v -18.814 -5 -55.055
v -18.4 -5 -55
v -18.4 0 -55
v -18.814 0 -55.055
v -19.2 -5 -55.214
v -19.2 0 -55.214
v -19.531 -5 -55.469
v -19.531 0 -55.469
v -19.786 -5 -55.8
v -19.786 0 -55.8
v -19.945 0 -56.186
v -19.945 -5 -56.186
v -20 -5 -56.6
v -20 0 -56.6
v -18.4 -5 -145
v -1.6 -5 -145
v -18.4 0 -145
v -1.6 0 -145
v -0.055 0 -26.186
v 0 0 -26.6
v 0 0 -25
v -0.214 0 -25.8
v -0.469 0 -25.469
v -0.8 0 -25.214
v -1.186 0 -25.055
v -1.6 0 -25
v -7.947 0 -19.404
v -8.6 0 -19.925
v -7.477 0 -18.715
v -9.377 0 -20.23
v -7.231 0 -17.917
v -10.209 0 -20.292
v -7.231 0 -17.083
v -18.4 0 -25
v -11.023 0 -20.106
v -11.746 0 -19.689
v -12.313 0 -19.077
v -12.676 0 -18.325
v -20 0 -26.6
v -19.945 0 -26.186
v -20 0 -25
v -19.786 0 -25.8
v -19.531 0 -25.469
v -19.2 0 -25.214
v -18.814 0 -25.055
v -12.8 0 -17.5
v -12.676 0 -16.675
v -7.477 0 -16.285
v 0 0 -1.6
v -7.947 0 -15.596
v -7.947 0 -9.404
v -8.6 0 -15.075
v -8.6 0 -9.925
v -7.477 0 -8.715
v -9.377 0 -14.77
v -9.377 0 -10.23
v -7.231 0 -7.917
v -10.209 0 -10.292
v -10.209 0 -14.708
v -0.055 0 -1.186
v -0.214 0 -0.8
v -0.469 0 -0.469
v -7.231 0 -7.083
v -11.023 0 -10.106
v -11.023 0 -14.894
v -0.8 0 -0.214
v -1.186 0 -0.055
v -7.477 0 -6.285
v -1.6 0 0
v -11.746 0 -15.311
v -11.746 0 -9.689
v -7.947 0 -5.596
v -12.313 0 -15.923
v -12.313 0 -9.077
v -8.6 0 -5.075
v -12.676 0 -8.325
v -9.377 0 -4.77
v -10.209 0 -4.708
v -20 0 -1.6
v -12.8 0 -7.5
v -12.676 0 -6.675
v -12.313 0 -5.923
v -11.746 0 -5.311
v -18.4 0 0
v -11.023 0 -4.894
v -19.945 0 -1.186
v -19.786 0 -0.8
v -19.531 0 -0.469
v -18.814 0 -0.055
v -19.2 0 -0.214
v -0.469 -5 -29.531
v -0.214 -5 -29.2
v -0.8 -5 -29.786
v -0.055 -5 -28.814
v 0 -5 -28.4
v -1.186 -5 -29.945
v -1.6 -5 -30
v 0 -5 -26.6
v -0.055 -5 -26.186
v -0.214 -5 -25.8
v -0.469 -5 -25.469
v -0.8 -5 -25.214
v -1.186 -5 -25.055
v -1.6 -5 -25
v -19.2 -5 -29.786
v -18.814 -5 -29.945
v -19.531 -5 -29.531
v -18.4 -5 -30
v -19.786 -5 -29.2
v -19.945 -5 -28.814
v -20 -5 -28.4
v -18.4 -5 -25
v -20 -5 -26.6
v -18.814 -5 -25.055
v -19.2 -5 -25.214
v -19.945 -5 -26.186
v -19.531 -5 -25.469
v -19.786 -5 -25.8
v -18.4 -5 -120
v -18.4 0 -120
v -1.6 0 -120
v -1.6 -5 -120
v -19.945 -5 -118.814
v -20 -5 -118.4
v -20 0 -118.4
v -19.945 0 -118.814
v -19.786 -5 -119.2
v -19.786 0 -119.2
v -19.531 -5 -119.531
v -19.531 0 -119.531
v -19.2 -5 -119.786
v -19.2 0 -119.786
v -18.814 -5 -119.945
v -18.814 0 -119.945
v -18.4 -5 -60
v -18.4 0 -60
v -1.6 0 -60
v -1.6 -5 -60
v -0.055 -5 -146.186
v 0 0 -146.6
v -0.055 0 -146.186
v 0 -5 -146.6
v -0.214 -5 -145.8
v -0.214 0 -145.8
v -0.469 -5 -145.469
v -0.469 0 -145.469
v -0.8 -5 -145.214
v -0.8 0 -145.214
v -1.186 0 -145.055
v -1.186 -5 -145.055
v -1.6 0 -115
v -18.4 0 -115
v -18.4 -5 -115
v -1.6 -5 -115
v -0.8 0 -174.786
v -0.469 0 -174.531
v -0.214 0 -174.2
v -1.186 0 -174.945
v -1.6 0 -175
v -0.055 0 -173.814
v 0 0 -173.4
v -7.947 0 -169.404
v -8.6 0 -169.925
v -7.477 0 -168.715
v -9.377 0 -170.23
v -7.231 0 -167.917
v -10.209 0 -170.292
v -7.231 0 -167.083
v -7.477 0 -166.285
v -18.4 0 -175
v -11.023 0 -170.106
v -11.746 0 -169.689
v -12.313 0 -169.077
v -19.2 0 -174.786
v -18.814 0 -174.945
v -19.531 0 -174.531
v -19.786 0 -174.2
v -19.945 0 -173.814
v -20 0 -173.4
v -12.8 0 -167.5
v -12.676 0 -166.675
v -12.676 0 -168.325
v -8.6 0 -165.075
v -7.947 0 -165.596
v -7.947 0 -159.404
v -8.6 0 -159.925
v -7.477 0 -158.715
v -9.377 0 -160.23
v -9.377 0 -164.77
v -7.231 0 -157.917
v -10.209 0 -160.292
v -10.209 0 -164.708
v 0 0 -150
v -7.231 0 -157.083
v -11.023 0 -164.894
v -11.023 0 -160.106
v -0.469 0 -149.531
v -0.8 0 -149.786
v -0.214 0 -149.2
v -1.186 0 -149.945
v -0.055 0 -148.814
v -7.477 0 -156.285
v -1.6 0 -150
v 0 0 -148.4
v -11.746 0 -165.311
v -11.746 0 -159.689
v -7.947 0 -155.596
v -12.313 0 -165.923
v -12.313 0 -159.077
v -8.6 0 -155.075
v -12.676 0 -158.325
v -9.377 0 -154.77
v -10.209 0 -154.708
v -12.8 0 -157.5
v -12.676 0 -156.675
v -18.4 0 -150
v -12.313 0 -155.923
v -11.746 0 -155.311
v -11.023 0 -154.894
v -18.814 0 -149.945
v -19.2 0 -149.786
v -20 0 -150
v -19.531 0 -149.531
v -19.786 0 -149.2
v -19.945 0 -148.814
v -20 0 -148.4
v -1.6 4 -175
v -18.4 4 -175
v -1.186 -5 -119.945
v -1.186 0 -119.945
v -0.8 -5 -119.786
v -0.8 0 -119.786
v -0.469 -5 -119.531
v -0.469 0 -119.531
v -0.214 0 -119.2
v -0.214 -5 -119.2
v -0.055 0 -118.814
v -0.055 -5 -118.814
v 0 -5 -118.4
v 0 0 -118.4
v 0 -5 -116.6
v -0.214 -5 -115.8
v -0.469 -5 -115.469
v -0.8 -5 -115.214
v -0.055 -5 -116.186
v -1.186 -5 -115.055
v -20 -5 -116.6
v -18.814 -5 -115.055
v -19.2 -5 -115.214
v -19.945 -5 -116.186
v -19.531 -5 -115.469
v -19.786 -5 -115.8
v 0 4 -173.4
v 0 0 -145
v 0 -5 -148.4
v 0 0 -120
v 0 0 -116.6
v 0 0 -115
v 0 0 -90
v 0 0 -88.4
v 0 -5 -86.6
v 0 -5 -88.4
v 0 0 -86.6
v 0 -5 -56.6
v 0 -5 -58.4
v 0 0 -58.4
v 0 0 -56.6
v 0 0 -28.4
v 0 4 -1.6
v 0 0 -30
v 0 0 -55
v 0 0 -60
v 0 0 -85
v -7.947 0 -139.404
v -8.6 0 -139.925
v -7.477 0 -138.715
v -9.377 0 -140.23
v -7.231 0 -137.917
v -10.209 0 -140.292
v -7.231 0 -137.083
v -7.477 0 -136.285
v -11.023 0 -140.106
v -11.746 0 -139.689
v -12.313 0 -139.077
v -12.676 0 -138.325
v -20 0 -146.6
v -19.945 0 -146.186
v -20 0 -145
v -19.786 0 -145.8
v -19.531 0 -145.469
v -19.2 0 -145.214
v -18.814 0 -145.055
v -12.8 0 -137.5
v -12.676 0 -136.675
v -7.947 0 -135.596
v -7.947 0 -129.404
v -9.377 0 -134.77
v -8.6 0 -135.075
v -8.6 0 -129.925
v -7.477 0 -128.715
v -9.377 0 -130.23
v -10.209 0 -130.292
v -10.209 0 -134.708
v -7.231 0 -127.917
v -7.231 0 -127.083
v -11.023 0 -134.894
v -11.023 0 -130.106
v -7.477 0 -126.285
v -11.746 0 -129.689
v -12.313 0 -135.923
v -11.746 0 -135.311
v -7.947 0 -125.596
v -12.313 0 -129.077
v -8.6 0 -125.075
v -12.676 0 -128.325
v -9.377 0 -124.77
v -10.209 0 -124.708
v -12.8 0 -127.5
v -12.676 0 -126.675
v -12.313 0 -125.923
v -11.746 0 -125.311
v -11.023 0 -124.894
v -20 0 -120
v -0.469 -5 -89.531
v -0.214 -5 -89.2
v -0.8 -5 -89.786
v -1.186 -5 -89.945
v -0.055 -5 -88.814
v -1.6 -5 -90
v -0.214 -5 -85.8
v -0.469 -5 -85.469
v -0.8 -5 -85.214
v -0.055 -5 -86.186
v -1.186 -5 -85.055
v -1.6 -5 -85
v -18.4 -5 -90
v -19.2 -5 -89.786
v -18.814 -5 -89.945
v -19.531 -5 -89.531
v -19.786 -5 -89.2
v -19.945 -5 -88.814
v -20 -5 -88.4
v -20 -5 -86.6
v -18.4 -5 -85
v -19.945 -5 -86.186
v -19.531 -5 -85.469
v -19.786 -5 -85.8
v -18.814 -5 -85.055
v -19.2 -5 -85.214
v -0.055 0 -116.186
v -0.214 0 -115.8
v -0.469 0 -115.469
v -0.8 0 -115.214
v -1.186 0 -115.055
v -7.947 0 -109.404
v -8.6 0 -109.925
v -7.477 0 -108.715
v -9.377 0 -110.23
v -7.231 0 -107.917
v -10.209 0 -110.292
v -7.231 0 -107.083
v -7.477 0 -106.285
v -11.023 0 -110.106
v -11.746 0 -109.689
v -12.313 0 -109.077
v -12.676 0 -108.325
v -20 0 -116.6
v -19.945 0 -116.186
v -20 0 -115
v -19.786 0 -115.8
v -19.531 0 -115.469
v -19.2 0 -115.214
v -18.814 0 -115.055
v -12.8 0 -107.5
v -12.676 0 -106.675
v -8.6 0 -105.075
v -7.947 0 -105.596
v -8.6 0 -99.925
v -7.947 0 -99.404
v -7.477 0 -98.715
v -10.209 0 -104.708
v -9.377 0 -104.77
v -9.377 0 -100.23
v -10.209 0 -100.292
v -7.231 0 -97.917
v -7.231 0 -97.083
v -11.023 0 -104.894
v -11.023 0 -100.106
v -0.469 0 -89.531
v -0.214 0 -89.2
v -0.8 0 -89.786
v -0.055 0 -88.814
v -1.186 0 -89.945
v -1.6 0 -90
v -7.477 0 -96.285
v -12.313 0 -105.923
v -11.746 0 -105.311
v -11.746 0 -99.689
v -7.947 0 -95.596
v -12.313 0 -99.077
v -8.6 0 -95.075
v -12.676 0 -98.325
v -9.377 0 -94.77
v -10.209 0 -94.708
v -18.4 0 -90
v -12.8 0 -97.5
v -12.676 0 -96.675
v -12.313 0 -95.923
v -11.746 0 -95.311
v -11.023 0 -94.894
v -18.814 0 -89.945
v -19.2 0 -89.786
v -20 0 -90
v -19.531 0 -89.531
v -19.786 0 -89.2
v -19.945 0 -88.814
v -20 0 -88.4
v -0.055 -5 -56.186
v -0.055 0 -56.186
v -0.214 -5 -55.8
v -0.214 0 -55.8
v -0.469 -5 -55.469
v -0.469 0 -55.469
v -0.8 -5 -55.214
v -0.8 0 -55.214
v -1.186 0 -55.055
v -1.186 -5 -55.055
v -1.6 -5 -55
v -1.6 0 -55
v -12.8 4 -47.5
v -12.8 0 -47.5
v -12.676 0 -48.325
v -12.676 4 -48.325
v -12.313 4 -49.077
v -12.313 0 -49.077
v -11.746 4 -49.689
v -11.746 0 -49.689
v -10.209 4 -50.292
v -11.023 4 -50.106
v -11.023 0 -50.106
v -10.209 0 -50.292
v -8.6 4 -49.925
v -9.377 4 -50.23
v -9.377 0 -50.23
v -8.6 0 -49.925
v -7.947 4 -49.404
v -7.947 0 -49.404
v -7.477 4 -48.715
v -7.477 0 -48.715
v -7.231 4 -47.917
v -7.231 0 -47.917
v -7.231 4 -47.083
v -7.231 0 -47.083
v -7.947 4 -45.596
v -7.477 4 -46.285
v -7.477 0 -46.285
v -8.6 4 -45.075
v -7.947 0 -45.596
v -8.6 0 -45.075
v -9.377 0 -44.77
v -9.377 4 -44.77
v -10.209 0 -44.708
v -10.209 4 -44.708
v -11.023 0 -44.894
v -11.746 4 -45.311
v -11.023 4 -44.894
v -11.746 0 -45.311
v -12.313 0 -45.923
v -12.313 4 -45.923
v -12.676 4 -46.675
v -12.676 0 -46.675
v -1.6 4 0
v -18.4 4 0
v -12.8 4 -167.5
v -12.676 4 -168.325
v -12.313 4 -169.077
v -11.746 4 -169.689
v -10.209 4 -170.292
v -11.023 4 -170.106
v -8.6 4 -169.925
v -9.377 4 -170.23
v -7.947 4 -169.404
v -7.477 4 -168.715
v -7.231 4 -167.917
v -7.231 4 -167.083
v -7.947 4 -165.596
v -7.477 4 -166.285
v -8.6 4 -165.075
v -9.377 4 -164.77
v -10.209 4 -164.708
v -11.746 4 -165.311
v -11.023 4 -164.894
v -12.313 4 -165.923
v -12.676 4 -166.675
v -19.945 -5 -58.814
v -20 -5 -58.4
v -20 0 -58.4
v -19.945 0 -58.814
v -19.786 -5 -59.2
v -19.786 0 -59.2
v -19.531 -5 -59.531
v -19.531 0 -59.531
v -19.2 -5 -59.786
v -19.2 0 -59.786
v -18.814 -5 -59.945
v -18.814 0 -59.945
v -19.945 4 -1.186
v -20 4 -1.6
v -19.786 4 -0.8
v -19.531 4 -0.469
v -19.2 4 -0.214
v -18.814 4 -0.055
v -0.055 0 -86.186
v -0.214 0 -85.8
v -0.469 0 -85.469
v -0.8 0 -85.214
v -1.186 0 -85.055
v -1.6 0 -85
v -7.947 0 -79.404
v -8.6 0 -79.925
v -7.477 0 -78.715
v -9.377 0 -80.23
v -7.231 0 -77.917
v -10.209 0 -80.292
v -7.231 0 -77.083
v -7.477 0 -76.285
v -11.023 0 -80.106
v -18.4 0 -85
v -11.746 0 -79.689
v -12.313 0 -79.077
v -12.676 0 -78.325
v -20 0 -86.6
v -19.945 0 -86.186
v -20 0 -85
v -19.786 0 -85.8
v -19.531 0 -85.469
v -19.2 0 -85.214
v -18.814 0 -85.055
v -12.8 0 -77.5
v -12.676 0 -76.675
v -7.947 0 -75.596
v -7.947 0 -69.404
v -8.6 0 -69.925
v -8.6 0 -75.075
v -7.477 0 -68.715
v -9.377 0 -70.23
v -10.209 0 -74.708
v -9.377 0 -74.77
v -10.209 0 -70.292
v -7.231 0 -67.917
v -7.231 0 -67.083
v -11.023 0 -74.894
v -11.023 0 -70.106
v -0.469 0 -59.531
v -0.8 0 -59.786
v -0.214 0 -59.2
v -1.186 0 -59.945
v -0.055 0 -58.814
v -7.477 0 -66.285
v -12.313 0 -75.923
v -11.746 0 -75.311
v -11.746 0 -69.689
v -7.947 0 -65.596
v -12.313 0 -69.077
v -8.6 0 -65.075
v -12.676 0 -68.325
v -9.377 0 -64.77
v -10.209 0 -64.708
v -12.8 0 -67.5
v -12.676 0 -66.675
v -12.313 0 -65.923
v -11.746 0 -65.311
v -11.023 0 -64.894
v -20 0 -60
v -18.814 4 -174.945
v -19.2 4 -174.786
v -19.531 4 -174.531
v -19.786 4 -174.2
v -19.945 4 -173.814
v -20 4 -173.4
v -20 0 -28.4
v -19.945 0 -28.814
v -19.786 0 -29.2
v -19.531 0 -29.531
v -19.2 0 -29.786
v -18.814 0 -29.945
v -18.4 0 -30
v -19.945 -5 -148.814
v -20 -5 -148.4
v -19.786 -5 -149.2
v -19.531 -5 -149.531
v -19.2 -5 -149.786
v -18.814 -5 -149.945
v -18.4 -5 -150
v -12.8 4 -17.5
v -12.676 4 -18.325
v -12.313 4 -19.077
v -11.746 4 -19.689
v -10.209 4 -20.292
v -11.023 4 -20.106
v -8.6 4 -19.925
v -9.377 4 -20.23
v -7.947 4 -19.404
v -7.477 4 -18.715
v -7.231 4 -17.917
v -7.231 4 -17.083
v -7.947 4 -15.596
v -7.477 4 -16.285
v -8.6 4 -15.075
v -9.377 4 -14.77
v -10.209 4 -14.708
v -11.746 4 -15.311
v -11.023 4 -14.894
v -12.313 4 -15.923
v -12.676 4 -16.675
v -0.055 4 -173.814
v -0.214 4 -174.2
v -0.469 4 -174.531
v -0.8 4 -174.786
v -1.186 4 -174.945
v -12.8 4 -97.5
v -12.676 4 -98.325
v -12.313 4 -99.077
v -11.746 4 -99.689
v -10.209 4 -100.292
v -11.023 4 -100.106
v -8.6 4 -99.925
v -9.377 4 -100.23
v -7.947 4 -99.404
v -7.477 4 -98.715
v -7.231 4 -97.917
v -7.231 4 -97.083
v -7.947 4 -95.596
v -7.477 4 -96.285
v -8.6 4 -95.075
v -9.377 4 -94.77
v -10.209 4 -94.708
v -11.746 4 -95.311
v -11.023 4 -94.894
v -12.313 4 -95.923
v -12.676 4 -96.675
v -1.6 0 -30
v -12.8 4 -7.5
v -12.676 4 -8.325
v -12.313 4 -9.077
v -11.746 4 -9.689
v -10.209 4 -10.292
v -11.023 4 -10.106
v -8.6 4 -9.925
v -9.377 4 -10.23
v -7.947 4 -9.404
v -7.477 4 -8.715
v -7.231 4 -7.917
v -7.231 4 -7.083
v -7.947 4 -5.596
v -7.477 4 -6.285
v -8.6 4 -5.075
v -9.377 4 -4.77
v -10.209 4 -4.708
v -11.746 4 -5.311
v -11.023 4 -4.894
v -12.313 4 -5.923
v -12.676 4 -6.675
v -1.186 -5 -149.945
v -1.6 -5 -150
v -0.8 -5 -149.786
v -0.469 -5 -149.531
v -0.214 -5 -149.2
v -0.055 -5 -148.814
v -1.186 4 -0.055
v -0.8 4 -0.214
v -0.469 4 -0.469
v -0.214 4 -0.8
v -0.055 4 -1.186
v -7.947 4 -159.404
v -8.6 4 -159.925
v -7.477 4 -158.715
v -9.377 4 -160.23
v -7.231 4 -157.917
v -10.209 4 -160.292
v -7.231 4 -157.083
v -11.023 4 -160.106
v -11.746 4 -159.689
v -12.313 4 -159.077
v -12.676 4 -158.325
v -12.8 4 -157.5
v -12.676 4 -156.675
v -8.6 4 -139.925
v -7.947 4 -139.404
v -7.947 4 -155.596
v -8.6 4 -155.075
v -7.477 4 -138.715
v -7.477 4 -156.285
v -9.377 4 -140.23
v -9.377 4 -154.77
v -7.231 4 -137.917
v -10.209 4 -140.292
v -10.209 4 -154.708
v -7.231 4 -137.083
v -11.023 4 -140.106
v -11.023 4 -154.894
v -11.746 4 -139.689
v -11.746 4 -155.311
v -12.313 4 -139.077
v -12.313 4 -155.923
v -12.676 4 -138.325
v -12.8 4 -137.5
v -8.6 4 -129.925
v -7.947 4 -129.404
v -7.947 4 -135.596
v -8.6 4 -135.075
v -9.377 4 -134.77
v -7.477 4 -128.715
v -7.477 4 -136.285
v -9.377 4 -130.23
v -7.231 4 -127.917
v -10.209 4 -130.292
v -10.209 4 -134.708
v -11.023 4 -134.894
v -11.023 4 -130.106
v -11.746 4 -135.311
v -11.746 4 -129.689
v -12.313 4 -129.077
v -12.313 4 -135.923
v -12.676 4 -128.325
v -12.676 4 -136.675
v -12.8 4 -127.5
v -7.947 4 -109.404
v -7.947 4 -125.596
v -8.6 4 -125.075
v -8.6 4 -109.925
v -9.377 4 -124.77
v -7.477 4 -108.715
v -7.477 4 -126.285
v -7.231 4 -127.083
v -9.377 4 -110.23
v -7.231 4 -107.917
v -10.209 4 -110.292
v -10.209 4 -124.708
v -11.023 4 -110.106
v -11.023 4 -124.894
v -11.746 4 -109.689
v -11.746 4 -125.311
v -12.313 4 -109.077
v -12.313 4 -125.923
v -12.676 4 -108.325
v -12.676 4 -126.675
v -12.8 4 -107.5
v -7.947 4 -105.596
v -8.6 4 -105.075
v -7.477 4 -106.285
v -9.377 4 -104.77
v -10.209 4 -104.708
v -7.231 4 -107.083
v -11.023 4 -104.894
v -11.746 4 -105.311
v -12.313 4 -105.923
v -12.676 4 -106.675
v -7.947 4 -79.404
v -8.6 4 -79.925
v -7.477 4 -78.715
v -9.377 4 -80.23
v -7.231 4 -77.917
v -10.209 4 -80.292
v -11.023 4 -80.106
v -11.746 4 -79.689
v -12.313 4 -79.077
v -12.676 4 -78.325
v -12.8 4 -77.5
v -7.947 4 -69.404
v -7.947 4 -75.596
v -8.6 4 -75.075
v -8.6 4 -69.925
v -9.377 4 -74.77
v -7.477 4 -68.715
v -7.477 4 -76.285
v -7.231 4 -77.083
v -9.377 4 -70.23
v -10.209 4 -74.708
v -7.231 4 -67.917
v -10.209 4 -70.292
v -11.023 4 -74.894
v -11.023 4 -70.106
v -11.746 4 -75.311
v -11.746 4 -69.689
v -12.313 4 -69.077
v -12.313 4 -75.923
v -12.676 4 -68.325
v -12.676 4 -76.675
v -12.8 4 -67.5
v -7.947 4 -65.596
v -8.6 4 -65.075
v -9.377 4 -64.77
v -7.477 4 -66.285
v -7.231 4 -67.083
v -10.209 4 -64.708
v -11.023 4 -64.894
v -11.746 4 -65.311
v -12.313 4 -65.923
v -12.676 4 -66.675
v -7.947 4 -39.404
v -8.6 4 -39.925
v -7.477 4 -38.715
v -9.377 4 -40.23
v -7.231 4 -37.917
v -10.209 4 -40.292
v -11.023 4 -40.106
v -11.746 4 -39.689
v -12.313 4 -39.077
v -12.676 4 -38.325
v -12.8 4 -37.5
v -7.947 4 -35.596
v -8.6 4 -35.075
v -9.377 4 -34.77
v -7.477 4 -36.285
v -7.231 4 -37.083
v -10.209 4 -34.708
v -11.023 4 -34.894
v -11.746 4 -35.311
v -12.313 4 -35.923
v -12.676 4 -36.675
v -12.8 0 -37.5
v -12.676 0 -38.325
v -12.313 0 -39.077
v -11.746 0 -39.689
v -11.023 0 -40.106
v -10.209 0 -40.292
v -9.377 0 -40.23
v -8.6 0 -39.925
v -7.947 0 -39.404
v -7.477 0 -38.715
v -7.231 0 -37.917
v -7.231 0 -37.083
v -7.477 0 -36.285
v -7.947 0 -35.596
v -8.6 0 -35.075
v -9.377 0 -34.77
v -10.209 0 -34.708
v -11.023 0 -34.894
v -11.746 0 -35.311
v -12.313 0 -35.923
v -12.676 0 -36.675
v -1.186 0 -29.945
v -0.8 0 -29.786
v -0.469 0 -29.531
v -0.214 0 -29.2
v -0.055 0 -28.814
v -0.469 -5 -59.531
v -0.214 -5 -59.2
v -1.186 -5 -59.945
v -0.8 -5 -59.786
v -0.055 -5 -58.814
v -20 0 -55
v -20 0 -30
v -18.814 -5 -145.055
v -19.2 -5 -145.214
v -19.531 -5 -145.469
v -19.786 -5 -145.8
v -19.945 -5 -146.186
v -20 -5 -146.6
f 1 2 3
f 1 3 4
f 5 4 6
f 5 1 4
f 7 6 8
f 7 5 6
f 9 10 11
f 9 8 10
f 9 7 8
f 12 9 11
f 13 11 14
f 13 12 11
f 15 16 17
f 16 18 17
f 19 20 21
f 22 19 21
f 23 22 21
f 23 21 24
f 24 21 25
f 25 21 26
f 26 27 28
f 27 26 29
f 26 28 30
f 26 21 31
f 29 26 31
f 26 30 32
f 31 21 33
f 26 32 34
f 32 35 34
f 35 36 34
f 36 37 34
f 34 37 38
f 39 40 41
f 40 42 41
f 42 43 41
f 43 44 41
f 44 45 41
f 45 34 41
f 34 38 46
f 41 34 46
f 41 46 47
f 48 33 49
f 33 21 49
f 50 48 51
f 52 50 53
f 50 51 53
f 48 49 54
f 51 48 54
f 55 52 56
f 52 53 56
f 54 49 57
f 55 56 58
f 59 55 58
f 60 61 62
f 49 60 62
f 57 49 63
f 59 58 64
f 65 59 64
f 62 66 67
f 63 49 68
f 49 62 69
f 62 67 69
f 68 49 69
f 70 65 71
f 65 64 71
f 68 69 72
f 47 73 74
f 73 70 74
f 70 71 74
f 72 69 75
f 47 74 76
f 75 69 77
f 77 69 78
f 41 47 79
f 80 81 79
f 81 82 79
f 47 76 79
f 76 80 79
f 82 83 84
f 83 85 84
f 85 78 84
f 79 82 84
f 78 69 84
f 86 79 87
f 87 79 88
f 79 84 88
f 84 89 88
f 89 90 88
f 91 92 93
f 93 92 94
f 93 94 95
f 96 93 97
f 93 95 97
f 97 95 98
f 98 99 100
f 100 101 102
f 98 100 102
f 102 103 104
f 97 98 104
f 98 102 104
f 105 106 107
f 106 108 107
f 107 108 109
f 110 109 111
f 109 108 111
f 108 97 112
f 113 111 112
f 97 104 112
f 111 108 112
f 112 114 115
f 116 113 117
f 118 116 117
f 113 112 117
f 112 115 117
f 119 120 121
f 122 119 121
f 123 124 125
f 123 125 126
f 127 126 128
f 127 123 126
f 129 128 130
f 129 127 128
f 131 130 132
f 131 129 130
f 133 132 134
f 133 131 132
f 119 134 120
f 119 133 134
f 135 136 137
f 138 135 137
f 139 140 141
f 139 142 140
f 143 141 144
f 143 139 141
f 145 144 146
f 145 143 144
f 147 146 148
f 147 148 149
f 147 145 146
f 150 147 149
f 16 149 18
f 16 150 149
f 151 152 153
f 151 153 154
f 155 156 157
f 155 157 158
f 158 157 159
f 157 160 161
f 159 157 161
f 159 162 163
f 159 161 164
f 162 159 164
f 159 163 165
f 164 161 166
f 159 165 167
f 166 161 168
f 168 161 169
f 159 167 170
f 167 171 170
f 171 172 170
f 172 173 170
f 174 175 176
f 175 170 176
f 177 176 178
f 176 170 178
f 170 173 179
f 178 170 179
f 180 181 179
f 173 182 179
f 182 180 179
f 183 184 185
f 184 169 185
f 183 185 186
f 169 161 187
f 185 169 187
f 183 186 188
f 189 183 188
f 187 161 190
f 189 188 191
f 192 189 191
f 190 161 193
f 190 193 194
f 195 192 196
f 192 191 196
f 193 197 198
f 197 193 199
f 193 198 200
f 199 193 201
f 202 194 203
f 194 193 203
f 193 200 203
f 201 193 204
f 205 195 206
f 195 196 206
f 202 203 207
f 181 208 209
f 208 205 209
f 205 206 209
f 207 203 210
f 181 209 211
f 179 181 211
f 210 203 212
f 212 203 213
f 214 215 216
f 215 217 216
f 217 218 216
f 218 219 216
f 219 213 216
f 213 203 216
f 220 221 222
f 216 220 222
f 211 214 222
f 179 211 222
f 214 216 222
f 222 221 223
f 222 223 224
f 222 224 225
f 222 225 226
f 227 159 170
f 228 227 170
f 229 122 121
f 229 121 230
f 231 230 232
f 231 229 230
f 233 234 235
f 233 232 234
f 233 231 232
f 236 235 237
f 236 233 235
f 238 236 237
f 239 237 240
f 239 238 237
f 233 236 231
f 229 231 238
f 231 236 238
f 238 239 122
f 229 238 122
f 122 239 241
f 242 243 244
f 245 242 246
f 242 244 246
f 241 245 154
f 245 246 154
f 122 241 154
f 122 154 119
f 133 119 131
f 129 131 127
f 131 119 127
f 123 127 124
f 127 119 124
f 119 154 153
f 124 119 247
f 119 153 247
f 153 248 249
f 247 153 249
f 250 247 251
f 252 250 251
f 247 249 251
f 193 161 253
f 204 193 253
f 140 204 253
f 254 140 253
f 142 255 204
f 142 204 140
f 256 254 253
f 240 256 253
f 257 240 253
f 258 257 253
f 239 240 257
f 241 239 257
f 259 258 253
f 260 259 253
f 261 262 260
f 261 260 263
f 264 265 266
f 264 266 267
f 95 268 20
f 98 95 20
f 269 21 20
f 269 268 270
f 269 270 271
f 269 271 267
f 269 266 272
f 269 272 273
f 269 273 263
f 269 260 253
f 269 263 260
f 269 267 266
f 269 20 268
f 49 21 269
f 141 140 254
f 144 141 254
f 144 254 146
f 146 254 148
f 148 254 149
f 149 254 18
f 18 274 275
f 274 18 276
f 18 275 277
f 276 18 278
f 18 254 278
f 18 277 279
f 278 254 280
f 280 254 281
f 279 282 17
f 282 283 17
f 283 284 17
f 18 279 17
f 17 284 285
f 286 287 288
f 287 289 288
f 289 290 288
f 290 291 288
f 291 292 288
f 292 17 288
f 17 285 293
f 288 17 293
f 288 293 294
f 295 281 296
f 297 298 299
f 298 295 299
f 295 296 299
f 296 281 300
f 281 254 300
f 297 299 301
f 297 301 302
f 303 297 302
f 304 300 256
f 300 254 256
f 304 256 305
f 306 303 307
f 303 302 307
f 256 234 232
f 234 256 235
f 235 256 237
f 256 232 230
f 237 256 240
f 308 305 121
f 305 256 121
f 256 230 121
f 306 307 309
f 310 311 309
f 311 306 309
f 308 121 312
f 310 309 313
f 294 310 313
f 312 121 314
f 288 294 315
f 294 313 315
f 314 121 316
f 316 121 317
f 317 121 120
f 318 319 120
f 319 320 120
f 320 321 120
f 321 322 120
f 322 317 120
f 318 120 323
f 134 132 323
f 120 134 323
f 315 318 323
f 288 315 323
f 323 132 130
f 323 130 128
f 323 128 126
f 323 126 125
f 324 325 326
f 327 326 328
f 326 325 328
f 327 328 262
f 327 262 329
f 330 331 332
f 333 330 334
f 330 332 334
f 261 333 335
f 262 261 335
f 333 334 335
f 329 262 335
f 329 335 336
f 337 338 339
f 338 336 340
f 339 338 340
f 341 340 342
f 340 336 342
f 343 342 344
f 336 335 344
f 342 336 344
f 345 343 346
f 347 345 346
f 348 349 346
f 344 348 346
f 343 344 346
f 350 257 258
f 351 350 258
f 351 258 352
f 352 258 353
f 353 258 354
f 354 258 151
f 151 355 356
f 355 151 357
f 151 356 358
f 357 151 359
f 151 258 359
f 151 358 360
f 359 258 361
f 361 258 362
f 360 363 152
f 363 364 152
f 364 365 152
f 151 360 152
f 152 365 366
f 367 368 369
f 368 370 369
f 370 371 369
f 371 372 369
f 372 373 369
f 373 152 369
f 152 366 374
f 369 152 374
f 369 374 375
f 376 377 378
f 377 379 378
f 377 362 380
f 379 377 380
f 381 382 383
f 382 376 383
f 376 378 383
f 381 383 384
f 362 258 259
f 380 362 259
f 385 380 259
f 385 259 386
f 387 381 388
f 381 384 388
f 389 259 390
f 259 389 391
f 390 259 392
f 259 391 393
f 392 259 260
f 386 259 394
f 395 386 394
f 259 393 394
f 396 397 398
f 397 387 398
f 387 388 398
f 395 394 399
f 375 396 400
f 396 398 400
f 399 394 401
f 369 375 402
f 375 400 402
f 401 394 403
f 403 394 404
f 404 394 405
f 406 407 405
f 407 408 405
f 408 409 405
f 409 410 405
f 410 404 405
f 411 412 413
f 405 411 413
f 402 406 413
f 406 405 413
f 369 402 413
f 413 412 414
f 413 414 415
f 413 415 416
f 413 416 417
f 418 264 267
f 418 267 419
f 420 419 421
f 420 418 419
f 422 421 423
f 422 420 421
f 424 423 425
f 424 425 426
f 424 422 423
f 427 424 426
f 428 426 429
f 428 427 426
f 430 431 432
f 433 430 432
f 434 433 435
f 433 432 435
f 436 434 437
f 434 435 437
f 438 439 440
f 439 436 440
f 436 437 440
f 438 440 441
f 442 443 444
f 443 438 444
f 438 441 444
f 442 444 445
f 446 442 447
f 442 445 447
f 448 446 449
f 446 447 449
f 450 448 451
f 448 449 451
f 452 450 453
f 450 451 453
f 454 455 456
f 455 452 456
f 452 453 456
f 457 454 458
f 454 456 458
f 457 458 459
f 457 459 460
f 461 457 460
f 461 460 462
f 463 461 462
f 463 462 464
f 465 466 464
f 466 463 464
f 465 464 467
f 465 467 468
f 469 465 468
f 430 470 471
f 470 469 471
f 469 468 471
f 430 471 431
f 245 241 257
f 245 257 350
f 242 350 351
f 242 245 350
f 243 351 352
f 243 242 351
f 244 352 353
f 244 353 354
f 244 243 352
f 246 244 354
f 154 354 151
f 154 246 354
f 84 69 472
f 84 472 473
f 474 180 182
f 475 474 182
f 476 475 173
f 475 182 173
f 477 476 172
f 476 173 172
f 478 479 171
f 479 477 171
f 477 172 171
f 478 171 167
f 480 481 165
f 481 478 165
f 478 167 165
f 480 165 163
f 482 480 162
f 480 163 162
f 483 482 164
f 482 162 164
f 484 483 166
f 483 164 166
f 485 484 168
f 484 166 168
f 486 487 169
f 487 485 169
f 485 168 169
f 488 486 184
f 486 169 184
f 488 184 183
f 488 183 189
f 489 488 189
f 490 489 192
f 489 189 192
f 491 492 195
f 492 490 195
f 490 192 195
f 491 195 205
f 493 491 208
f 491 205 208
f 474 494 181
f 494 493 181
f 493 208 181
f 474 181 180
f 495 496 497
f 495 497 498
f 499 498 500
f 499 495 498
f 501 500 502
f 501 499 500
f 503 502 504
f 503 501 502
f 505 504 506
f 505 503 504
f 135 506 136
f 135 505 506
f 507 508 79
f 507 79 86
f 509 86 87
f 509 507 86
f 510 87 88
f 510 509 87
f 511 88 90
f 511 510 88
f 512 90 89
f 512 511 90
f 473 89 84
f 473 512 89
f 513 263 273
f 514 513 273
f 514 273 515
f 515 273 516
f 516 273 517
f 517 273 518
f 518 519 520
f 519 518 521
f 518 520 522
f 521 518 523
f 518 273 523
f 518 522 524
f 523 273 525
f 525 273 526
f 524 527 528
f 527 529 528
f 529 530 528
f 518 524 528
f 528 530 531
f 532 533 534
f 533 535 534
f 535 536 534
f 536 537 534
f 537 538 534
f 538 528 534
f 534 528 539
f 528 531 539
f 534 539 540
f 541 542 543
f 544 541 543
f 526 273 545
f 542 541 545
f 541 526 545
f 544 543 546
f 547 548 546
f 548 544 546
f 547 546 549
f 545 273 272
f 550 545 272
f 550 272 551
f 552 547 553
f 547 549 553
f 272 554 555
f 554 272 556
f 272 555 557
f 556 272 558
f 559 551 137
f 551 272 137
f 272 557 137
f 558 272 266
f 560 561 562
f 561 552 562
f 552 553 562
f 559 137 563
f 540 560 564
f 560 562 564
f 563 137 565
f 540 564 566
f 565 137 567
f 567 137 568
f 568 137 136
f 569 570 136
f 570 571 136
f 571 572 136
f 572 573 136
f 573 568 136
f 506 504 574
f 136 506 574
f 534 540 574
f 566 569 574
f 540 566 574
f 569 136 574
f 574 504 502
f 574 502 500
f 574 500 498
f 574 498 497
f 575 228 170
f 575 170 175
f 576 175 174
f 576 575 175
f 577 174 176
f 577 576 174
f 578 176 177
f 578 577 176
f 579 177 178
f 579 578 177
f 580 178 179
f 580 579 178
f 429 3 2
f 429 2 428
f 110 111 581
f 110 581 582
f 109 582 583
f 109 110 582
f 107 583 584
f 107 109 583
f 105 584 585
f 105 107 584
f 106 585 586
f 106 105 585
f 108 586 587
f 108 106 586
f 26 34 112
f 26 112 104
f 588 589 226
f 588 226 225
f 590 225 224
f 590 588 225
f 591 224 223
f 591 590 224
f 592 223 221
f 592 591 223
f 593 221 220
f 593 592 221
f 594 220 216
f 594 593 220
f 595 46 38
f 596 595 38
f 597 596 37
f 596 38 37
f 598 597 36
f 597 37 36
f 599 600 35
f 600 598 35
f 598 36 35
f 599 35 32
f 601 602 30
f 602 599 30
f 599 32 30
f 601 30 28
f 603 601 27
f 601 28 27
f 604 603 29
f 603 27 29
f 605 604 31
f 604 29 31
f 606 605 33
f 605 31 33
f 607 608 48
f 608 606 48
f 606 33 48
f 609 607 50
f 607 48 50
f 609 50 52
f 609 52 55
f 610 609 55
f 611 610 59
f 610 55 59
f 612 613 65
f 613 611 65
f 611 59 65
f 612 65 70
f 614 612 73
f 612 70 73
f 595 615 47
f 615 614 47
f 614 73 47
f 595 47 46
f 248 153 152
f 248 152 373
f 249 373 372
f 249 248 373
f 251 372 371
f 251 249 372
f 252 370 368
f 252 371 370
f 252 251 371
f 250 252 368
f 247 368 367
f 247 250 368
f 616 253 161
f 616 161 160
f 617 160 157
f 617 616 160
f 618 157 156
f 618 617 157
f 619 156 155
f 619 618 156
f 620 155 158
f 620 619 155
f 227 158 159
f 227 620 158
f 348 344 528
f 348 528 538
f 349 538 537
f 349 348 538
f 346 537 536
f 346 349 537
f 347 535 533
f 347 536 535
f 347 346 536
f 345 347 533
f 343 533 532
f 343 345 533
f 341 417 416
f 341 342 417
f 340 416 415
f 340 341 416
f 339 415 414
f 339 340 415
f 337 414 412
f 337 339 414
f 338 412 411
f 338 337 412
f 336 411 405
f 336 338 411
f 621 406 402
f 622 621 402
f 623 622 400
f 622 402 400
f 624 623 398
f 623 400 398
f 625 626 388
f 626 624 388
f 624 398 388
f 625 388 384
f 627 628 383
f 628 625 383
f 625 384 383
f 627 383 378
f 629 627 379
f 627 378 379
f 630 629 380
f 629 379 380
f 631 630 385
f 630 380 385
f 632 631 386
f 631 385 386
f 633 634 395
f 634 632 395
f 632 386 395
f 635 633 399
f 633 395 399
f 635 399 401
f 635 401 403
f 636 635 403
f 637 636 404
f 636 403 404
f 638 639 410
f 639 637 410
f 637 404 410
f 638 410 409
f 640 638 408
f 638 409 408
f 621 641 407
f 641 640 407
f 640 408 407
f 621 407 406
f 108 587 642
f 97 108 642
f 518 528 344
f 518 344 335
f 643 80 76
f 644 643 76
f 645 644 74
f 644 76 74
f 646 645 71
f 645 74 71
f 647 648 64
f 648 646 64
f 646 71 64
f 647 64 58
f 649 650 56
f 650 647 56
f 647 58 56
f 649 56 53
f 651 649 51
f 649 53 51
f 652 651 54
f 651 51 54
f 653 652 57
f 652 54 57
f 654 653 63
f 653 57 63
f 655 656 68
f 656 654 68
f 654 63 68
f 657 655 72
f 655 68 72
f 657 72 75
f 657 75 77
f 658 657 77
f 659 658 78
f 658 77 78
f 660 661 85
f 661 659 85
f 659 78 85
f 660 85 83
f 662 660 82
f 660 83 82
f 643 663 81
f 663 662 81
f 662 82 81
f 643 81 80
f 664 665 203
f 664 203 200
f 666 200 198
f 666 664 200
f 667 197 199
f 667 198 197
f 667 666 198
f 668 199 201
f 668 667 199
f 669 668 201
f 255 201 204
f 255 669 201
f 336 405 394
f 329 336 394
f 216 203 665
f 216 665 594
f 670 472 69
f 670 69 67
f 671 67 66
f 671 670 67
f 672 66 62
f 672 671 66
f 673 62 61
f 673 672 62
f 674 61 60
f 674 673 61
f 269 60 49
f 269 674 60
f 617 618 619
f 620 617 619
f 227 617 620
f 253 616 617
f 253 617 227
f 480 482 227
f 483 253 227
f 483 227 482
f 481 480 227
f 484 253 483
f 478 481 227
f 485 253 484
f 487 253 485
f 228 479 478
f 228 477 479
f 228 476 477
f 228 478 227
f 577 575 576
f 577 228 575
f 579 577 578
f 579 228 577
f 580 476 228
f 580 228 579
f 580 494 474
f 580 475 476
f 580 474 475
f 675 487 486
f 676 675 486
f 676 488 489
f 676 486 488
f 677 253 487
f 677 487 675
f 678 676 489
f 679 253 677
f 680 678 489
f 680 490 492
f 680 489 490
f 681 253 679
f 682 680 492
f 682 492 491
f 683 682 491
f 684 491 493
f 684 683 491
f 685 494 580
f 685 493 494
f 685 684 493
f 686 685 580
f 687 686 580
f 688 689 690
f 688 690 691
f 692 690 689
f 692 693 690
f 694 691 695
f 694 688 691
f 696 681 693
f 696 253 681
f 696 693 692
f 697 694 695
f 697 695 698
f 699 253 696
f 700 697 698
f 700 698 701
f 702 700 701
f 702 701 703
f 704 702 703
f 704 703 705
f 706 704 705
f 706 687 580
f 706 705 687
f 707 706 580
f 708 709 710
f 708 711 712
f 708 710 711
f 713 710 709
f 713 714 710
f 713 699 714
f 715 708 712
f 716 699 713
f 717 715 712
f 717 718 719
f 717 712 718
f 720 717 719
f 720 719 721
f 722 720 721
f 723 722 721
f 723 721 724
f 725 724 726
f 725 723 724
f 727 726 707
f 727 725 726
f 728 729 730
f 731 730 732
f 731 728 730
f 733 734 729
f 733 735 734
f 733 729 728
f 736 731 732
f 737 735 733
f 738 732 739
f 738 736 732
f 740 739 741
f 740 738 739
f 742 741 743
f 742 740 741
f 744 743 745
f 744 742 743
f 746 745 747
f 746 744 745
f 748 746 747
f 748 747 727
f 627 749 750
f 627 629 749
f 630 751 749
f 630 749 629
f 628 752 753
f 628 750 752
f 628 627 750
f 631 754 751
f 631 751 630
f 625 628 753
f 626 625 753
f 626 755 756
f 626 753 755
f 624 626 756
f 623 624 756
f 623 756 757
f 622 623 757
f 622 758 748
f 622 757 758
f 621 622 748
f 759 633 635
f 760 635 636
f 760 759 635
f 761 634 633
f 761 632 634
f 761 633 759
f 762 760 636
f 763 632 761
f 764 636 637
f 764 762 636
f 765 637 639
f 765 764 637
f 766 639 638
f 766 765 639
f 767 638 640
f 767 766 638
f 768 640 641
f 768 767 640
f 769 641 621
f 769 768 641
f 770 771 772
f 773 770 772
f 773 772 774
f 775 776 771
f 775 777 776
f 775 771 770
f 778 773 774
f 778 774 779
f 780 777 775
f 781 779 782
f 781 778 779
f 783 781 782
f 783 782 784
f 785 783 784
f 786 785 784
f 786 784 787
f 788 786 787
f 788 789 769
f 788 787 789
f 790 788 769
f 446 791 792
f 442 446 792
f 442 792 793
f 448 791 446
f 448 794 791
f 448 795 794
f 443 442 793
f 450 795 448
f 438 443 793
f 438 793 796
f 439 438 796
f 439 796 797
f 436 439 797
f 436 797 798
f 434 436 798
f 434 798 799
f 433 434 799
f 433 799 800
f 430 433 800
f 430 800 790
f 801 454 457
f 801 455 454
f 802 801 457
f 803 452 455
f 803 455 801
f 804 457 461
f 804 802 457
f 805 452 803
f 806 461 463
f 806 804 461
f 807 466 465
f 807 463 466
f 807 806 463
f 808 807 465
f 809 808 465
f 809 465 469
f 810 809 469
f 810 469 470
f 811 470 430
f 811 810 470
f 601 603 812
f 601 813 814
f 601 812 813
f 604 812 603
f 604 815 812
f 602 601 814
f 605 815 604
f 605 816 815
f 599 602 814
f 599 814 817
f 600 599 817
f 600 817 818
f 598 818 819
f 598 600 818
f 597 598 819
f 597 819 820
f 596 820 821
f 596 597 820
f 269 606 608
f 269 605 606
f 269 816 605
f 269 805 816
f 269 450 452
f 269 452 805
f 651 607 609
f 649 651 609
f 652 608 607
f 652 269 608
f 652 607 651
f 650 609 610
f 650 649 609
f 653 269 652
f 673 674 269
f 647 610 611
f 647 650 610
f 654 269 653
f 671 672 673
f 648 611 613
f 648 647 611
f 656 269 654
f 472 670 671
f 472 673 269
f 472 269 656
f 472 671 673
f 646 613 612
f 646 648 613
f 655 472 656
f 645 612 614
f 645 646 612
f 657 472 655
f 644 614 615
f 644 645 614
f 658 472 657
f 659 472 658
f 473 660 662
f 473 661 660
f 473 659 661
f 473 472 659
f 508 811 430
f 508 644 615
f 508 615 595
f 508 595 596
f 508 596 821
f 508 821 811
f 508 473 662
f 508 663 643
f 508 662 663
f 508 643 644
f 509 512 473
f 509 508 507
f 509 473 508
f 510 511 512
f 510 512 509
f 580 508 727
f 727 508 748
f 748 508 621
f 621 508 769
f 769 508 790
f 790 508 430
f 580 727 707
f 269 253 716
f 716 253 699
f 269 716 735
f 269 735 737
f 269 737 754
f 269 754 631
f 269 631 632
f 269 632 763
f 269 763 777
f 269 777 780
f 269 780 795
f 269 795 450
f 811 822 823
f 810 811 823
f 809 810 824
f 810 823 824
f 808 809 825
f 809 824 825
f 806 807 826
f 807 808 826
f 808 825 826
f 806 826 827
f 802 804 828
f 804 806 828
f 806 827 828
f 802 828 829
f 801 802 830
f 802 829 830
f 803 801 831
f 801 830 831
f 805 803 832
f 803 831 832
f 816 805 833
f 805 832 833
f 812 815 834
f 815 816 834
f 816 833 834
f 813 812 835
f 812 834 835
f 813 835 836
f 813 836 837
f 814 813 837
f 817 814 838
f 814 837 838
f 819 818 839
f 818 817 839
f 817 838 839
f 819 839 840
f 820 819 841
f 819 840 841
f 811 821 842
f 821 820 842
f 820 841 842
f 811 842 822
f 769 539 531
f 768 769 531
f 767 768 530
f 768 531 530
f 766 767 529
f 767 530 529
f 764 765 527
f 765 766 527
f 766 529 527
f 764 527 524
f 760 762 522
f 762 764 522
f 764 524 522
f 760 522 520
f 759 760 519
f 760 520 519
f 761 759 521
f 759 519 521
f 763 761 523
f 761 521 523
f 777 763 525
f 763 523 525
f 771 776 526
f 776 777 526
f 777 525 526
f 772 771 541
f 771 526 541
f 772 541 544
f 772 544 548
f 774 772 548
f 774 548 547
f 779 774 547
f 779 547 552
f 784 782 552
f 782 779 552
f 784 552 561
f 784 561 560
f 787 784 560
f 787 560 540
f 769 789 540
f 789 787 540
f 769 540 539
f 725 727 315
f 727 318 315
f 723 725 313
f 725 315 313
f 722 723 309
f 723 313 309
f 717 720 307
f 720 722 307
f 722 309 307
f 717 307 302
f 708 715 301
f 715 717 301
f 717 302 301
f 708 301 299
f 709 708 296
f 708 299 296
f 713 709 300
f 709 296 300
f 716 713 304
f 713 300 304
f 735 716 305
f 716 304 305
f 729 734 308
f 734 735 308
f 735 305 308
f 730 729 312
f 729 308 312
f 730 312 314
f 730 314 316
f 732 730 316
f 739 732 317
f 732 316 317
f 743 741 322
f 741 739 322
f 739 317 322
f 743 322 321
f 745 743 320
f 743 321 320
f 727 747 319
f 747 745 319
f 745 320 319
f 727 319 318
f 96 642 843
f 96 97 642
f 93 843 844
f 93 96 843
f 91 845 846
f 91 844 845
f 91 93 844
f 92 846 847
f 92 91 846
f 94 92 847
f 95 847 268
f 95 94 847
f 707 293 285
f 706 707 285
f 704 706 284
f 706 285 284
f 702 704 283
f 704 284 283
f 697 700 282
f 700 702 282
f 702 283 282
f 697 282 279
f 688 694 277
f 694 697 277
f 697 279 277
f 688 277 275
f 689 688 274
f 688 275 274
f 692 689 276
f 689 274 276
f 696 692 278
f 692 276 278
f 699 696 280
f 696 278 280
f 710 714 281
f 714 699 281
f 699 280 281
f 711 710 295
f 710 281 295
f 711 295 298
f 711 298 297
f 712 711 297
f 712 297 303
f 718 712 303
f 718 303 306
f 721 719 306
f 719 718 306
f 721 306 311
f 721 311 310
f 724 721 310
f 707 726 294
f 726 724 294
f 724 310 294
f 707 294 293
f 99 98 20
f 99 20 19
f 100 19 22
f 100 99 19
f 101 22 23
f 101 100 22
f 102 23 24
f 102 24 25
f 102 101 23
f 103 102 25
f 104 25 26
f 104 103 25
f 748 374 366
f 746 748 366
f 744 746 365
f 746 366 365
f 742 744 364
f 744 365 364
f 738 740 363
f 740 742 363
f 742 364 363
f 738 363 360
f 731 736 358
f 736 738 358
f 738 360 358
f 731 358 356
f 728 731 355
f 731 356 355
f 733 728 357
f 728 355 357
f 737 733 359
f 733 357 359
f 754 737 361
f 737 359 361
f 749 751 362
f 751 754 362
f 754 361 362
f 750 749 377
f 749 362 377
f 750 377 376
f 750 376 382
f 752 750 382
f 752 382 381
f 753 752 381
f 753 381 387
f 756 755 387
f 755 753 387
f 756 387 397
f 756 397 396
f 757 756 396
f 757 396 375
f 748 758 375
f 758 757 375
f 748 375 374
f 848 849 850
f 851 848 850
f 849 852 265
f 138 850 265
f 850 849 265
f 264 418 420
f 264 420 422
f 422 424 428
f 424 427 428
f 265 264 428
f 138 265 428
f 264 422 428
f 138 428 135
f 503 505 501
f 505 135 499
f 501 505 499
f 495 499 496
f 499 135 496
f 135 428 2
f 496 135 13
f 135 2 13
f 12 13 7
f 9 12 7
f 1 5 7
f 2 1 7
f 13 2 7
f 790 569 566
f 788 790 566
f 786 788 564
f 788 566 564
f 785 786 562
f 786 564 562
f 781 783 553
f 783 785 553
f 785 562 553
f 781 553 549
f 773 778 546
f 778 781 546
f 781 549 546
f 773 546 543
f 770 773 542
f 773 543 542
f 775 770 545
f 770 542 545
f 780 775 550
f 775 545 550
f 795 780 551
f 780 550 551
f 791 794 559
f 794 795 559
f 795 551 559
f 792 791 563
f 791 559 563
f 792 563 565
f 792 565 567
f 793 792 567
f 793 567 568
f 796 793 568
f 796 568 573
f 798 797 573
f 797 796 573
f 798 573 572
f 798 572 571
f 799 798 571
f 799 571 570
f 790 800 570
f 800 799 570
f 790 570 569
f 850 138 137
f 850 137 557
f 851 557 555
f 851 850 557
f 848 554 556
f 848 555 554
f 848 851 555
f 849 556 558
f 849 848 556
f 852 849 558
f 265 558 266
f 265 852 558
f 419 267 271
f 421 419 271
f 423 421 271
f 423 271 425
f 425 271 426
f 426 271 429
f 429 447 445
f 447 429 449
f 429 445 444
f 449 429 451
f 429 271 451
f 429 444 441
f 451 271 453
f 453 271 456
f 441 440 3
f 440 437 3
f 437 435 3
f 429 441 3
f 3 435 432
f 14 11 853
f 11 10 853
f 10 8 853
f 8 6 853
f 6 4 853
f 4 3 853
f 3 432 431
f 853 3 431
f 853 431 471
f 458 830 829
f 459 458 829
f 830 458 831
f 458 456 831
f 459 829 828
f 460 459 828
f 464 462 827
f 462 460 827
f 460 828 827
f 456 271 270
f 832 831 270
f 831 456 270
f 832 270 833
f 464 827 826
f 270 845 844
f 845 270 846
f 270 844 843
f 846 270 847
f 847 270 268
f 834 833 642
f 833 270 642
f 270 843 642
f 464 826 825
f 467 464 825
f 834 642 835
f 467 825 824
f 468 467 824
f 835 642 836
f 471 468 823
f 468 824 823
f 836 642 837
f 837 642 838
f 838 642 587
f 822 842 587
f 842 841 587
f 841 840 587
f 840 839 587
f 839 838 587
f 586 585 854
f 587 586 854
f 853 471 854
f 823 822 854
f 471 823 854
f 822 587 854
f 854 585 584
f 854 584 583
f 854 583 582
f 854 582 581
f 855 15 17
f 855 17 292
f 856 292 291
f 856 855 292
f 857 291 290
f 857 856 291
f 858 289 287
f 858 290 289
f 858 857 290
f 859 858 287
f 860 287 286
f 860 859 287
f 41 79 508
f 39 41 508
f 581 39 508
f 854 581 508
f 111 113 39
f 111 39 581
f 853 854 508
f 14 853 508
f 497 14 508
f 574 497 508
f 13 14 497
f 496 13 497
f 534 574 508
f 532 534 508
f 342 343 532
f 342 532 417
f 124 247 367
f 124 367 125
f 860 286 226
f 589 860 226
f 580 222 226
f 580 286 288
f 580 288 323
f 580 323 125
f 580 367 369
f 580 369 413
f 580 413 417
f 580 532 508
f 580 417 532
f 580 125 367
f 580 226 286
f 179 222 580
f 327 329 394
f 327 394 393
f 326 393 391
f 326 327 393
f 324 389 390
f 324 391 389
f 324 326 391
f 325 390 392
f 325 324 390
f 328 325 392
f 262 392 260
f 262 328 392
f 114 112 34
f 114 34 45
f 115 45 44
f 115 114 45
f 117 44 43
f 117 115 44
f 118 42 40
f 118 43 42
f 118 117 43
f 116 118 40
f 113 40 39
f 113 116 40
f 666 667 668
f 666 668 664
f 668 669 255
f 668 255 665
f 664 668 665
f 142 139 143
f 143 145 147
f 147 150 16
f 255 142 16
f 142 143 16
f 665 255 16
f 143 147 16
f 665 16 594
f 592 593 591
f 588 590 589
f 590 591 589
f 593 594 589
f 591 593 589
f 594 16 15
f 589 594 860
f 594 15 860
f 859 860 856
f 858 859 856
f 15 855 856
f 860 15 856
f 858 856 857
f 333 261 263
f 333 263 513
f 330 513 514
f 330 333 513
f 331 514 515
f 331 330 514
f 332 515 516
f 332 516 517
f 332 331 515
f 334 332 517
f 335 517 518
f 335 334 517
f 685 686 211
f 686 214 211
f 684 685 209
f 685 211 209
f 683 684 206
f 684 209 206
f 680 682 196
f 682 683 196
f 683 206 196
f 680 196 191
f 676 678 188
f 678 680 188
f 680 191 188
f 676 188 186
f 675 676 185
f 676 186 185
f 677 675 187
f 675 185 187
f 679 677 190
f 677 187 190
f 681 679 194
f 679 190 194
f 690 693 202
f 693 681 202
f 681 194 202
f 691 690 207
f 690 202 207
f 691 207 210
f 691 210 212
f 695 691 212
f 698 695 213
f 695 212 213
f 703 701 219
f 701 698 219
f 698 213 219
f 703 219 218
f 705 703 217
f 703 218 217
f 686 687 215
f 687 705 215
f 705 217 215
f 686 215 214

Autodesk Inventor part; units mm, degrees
ref_plane "YZ Plane" through (0, 0, 0) normal (1, 0, 0) x (0, 1, 0)
ref_plane "XZ Plane" through (0, 0, 0) normal (0, 1, 0) x (-1, 0, 0)
ref_plane "XY Plane" through (0, 0, 0) normal (0, 0, 1) x (1, 0, 0)
sketch "Szkic1" plane through (0, 0, 0) normal (0, 1, 0) x (-1, 0, 0)
  line L0 (0, 0) -> (20, 0)
  line L1 (20, 0) -> (20, -25)
  line L2 (20, -25) -> (0, -25)
  line L3 (0, -25) -> (0, 0)
  line L4 (0, -25) -> (20, -25)
  line L5 (20, -25) -> (20, -30)
  line L6 (20, -30) -> (0, -30)
  line L7 (0, -30) -> (0, -25)
  line L8 (0, -30) -> (20, -30)
  line L9 (0, -30) -> (20, -30)
  line L10 (20, -30) -> (20, -55)
  line L11 (20, -55) -> (0, -55)
  line L12 (0, -55) -> (0, -30)
  line L13 (0, -55) -> (20, -55)
  line L14 (20, -55) -> (20, -60)
  line L15 (20, -60) -> (0, -60)
  line L16 (0, -60) -> (0, -55)
  line L17 (0, -60) -> (12.1994, -60)
  line L18 (0, -60) -> (20, -60)
  line L19 (20, -60) -> (20, -85)
  line L20 (20, -85) -> (0, -85)
  line L21 (0, -85) -> (0, -60)
  line L22 (0, -85) -> (20, -85)
  line L23 (20, -85) -> (20, -90)
  line L24 (20, -90) -> (0, -90)
  line L25 (0, -90) -> (0, -85)
  line L26 (0, -90) -> (12.1994, -90)
  line L27 (0, -90) -> (20, -90)
  line L28 (20, -90) -> (20, -115)
  line L29 (20, -115) -> (0, -115)
  line L30 (0, -115) -> (0, -90)
  line L31 (0, -115) -> (20, -115)
  line L32 (20, -115) -> (20, -120)
  line L33 (20, -120) -> (0, -120)
  line L34 (0, -120) -> (0, -115)
  line L35 (0, -120) -> (3.8166, -120)
  line L36 (20, -120) -> (0, -120)
  line L37 (0, -120) -> (0, -145)
  line L38 (0, -145) -> (20, -145)
  line L39 (20, -145) -> (20, -120)
  circle A0 centre (10, -7.5) radius 2.8
  circle A1 centre (10, -17.5) radius 2.8
  line L40 (20, -42.5) -> (0, -42.5) construction
  line L41 (20, -72.5) -> (0, -72.5) construction
  line L42 (20, -102.5) -> (0, -102.5) construction
  line L43 (20, -132.5) -> (0, -132.5) construction
  line L44 (20, -12.5) -> (0, -12.5) construction
  circle A2 centre (10, -47.5) radius 2.8
  circle A3 centre (10, -37.5) radius 2.8
  circle A4 centre (10, -77.5) radius 2.8
  circle A5 centre (10, -67.5) radius 2.8
  circle A6 centre (10, -107.5) radius 2.8
  circle A7 centre (10, -97.5) radius 2.8
  circle A8 centre (10, -137.5) radius 2.8
  circle A9 centre (10, -127.5) radius 2.8
  circle A10 centre (10, -167.5) radius 2.8
  circle A11 centre (10, -157.5) radius 2.8
  line L45 (20, -145) -> (0, -145)
  line L46 (0, -145) -> (0, -150)
  line L47 (0, -150) -> (20, -150)
  line L48 (20, -150) -> (20, -145)
  line L49 (20, -150) -> (0, -150)
  line L50 (0, -150) -> (0, -175)
  line L51 (0, -175) -> (20, -175)
  line L52 (20, -175) -> (20, -150)
  line L53 (20, -162.5) -> (0, -162.5) construction
  dimension "d2" = 20
  dimension "d3" = 25
  dimension "d4" = 5
  dimension "d14" = 10
  dimension "d16" = 10
  dimension "d17" = 5.6
  dimension "d20" = 30
extrude "Wyciągnięcie proste1" add sketch "Szkic1" along normal blind 4
extrude "Wyciągnięcie proste2" add sketch "Szkic1" against normal blind 5 contours L2 L5 L6 L7 | L11 L14 L15 L16 | L20 L23 L24 L25 | L29 L32 L33 L34 | L38 L48 L47 L46
fillet "Zaokrąglenie1" radius 1.6 24 edges at (0, 2, 0) (-20, 2, 0) (0, 2, -175) (-20, 2, -175) (-20, -2.5, -150) (0, -2.5, -150) (0, -2.5, -145) (-20, -2.5, -145) (0, -2.5, -120) (0, -2.5, -115) (-20, -2.5, -120) (-20, -2.5, -115) (-20, -2.5, -90) (-20, -2.5, -85) (0, -2.5, -90) (0, -2.5, -85) (0, -2.5, -60) (0, -2.5, -55) (-20, -2.5, -55) (-20, -2.5, -60) (-20, -2.5, -30) (-20, -2.5, -25) (0, -2.5, -25) (0, -2.5, -30)
equation "\"d16\" = 0.5 * d2"
properties part number "belka_poprzeg" material "PLA"
